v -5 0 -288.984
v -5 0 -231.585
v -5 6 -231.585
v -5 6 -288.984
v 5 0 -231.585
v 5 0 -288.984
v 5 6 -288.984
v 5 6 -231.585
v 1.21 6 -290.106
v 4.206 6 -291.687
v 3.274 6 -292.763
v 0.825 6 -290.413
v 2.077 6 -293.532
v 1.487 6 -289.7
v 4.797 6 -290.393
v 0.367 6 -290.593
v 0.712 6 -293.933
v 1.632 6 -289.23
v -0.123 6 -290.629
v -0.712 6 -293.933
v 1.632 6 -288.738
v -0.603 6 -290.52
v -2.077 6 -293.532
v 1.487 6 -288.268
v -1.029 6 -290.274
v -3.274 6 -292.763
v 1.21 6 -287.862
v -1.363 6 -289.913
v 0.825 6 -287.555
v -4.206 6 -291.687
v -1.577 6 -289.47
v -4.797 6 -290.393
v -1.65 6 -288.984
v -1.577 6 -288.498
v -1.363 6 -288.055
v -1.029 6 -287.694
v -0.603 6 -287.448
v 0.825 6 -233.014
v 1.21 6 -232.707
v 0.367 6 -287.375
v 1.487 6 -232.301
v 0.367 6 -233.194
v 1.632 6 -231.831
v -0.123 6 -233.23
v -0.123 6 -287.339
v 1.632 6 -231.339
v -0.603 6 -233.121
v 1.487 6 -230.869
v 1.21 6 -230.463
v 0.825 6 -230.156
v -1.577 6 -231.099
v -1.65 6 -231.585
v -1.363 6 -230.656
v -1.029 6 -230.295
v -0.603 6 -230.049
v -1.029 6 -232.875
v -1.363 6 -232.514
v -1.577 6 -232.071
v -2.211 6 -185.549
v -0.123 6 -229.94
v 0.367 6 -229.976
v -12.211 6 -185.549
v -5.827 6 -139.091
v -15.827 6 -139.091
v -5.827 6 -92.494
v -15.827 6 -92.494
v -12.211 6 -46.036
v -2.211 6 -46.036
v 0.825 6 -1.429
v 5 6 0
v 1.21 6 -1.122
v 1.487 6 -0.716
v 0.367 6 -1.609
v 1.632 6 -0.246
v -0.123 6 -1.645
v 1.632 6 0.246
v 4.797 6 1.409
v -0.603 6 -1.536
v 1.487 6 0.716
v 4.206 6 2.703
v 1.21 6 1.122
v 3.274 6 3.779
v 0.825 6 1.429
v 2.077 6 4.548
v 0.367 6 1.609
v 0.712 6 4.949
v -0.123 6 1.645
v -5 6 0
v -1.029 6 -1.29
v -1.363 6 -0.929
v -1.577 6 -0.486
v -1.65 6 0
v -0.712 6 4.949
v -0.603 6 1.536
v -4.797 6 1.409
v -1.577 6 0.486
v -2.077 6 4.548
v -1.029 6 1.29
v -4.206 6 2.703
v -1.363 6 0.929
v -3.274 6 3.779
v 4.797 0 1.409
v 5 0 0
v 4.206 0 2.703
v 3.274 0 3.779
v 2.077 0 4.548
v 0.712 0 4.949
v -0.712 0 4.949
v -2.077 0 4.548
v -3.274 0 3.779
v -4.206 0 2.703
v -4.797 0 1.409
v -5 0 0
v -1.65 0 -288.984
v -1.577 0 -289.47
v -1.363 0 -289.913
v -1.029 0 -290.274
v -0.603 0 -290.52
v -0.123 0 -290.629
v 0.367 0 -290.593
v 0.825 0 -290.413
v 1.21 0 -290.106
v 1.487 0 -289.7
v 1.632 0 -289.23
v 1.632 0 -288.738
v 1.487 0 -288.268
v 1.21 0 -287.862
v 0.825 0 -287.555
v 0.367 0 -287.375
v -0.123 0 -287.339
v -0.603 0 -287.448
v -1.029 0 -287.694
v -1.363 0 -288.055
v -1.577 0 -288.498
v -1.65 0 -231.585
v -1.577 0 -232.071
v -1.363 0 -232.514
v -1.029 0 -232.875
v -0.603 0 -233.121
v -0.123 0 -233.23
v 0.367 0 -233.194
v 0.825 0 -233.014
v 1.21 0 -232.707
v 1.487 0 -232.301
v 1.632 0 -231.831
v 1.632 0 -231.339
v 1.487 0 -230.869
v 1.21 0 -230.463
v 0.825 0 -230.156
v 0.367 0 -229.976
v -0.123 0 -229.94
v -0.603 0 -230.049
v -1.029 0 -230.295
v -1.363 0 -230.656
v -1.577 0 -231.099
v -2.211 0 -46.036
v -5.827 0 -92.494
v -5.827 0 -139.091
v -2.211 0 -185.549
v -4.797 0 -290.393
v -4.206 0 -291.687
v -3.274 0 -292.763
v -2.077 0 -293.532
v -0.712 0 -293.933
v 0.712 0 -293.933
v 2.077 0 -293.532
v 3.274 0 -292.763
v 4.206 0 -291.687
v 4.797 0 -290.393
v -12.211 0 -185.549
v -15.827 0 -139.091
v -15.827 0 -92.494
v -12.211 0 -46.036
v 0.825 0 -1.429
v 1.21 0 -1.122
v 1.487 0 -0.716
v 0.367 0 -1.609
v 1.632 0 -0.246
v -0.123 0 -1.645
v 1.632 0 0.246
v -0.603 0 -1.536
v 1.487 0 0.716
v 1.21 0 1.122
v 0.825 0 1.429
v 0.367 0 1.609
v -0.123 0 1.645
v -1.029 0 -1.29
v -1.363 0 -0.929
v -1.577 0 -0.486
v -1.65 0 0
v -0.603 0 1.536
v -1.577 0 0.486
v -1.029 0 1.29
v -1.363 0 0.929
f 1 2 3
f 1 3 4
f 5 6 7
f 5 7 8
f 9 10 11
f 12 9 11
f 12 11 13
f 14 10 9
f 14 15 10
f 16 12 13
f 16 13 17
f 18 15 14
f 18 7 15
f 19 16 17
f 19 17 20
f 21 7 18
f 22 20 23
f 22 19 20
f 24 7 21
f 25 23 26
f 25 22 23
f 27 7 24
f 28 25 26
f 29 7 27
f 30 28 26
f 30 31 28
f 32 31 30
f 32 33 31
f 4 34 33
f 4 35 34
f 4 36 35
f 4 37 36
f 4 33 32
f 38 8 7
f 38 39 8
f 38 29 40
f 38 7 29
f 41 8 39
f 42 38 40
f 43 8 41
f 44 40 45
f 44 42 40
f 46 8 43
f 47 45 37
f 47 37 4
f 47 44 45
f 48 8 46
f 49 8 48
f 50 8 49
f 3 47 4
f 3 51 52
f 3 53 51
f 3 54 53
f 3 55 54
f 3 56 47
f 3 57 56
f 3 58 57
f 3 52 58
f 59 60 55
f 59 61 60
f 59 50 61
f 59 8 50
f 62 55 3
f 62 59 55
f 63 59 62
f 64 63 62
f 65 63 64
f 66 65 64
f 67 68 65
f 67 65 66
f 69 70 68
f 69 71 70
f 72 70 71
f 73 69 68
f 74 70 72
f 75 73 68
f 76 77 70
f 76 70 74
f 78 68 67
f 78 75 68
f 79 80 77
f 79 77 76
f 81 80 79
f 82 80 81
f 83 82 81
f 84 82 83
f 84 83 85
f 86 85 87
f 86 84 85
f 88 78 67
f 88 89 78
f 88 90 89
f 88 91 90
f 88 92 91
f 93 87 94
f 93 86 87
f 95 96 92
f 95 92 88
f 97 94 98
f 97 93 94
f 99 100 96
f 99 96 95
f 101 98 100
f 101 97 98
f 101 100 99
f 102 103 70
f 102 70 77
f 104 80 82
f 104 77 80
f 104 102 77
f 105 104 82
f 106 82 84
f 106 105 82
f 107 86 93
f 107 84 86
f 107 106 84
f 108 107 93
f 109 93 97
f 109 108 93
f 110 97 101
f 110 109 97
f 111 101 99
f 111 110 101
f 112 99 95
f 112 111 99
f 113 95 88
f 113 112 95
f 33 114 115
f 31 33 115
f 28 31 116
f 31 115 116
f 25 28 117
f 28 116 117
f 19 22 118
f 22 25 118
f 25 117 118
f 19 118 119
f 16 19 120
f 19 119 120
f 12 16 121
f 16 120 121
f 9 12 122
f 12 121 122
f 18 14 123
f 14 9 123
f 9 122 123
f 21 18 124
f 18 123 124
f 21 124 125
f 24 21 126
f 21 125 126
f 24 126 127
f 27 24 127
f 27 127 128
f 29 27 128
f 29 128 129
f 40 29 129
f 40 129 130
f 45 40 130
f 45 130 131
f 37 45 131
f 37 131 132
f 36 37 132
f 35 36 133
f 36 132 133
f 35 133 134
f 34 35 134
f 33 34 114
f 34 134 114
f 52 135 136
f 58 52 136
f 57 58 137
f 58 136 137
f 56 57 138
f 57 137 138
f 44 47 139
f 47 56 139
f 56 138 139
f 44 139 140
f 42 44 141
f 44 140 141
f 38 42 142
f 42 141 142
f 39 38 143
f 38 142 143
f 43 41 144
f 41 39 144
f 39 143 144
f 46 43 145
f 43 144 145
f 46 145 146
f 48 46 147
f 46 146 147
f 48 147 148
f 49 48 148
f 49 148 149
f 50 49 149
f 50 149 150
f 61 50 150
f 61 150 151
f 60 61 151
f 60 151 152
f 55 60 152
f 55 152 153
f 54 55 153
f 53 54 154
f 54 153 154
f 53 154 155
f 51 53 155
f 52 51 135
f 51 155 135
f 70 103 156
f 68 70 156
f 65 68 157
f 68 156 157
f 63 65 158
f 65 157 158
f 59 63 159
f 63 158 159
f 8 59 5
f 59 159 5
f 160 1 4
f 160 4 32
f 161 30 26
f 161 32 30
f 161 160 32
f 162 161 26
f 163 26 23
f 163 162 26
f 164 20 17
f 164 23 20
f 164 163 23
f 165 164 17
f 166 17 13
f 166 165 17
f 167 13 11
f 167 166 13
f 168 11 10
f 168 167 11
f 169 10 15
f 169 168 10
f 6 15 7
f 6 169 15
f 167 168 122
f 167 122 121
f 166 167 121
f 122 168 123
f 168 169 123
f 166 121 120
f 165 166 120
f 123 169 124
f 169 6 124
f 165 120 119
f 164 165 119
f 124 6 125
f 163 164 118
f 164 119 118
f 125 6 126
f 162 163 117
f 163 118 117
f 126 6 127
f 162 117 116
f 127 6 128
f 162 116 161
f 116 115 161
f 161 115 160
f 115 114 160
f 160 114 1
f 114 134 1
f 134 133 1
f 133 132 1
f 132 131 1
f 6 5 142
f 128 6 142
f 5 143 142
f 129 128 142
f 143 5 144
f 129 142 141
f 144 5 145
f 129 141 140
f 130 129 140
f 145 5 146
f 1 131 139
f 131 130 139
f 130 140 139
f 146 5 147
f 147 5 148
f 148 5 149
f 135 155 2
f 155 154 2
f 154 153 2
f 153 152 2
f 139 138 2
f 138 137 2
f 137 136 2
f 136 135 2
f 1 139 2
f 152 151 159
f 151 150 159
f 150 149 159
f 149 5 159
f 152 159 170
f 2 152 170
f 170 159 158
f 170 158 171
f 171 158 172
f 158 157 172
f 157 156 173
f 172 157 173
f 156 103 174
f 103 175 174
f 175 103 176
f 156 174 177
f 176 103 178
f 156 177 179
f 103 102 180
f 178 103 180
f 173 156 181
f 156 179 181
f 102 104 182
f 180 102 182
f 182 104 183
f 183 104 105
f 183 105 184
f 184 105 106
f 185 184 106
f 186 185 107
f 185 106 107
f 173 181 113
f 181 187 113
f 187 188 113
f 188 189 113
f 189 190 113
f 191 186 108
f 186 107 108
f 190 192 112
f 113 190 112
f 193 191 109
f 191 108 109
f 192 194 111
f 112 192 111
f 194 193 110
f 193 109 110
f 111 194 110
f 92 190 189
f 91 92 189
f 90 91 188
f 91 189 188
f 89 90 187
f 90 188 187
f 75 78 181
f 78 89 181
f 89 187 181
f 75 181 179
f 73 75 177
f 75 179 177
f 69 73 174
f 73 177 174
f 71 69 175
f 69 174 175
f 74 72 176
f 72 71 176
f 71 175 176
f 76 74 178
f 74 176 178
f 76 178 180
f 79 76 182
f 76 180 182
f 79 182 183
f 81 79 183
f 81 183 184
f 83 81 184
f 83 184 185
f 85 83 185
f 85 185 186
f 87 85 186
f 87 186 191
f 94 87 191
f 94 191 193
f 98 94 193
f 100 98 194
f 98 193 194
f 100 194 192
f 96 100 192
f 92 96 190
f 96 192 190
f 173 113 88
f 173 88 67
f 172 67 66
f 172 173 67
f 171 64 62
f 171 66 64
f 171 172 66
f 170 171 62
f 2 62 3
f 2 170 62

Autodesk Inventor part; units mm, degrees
ref_plane "YZ Plane" through (0, 0, 0) normal (1, 0, 0) x (0, 1, 0)
ref_plane "XZ Plane" through (0, 0, 0) normal (0, 1, 0) x (-1, 0, 0)
ref_plane "XY Plane" through (0, 0, 0) normal (0, 0, 1) x (1, 0, 0)
sketch "Sketch1" plane through (0, 0, 0) normal (0, 1, 0) x (-1, 0, 0)
  line L0 (0, 0) -> (0, -288.984) construction
  line L1 (5, 0) -> (5, -288.984)
  line L2 (-5, -288.984) -> (-5, 0)
  arc A0 (5, 0) -> (-5, 0) centre (0, 0) ccw
  arc A1 (-5, -288.984) -> (5, -288.984) centre (0, -288.984) ccw
  circle A2 centre (0, 0) radius 1.65
  circle A3 centre (0, -288.984) radius 1.65
  circle A4 centre (0, -231.585) radius 1.65
  arc A5 (-5, -231.585) -> (-5, 0) centre (-593.7207, -115.7925) ccw
  arc A6 (5, -231.585) -> (5, 0) centre (-583.7207, -115.7925) ccw
  point P0 (0, -144.492)
  dimension "d0" = 3.3
  dimension "d1" = 3.3
  dimension "d2" = 10
  dimension "d3" = 288.984
  dimension "d14" = 3.3
  dimension "d15" = 231.585
  dimension "d18" = 600
  dimension "d19" = 600
extrude "Extrusion1" add sketch "Sketch1" along normal blind 6 contours L1 A1 L2 A5 | L1 A5 A6 | L1 A5 A0
